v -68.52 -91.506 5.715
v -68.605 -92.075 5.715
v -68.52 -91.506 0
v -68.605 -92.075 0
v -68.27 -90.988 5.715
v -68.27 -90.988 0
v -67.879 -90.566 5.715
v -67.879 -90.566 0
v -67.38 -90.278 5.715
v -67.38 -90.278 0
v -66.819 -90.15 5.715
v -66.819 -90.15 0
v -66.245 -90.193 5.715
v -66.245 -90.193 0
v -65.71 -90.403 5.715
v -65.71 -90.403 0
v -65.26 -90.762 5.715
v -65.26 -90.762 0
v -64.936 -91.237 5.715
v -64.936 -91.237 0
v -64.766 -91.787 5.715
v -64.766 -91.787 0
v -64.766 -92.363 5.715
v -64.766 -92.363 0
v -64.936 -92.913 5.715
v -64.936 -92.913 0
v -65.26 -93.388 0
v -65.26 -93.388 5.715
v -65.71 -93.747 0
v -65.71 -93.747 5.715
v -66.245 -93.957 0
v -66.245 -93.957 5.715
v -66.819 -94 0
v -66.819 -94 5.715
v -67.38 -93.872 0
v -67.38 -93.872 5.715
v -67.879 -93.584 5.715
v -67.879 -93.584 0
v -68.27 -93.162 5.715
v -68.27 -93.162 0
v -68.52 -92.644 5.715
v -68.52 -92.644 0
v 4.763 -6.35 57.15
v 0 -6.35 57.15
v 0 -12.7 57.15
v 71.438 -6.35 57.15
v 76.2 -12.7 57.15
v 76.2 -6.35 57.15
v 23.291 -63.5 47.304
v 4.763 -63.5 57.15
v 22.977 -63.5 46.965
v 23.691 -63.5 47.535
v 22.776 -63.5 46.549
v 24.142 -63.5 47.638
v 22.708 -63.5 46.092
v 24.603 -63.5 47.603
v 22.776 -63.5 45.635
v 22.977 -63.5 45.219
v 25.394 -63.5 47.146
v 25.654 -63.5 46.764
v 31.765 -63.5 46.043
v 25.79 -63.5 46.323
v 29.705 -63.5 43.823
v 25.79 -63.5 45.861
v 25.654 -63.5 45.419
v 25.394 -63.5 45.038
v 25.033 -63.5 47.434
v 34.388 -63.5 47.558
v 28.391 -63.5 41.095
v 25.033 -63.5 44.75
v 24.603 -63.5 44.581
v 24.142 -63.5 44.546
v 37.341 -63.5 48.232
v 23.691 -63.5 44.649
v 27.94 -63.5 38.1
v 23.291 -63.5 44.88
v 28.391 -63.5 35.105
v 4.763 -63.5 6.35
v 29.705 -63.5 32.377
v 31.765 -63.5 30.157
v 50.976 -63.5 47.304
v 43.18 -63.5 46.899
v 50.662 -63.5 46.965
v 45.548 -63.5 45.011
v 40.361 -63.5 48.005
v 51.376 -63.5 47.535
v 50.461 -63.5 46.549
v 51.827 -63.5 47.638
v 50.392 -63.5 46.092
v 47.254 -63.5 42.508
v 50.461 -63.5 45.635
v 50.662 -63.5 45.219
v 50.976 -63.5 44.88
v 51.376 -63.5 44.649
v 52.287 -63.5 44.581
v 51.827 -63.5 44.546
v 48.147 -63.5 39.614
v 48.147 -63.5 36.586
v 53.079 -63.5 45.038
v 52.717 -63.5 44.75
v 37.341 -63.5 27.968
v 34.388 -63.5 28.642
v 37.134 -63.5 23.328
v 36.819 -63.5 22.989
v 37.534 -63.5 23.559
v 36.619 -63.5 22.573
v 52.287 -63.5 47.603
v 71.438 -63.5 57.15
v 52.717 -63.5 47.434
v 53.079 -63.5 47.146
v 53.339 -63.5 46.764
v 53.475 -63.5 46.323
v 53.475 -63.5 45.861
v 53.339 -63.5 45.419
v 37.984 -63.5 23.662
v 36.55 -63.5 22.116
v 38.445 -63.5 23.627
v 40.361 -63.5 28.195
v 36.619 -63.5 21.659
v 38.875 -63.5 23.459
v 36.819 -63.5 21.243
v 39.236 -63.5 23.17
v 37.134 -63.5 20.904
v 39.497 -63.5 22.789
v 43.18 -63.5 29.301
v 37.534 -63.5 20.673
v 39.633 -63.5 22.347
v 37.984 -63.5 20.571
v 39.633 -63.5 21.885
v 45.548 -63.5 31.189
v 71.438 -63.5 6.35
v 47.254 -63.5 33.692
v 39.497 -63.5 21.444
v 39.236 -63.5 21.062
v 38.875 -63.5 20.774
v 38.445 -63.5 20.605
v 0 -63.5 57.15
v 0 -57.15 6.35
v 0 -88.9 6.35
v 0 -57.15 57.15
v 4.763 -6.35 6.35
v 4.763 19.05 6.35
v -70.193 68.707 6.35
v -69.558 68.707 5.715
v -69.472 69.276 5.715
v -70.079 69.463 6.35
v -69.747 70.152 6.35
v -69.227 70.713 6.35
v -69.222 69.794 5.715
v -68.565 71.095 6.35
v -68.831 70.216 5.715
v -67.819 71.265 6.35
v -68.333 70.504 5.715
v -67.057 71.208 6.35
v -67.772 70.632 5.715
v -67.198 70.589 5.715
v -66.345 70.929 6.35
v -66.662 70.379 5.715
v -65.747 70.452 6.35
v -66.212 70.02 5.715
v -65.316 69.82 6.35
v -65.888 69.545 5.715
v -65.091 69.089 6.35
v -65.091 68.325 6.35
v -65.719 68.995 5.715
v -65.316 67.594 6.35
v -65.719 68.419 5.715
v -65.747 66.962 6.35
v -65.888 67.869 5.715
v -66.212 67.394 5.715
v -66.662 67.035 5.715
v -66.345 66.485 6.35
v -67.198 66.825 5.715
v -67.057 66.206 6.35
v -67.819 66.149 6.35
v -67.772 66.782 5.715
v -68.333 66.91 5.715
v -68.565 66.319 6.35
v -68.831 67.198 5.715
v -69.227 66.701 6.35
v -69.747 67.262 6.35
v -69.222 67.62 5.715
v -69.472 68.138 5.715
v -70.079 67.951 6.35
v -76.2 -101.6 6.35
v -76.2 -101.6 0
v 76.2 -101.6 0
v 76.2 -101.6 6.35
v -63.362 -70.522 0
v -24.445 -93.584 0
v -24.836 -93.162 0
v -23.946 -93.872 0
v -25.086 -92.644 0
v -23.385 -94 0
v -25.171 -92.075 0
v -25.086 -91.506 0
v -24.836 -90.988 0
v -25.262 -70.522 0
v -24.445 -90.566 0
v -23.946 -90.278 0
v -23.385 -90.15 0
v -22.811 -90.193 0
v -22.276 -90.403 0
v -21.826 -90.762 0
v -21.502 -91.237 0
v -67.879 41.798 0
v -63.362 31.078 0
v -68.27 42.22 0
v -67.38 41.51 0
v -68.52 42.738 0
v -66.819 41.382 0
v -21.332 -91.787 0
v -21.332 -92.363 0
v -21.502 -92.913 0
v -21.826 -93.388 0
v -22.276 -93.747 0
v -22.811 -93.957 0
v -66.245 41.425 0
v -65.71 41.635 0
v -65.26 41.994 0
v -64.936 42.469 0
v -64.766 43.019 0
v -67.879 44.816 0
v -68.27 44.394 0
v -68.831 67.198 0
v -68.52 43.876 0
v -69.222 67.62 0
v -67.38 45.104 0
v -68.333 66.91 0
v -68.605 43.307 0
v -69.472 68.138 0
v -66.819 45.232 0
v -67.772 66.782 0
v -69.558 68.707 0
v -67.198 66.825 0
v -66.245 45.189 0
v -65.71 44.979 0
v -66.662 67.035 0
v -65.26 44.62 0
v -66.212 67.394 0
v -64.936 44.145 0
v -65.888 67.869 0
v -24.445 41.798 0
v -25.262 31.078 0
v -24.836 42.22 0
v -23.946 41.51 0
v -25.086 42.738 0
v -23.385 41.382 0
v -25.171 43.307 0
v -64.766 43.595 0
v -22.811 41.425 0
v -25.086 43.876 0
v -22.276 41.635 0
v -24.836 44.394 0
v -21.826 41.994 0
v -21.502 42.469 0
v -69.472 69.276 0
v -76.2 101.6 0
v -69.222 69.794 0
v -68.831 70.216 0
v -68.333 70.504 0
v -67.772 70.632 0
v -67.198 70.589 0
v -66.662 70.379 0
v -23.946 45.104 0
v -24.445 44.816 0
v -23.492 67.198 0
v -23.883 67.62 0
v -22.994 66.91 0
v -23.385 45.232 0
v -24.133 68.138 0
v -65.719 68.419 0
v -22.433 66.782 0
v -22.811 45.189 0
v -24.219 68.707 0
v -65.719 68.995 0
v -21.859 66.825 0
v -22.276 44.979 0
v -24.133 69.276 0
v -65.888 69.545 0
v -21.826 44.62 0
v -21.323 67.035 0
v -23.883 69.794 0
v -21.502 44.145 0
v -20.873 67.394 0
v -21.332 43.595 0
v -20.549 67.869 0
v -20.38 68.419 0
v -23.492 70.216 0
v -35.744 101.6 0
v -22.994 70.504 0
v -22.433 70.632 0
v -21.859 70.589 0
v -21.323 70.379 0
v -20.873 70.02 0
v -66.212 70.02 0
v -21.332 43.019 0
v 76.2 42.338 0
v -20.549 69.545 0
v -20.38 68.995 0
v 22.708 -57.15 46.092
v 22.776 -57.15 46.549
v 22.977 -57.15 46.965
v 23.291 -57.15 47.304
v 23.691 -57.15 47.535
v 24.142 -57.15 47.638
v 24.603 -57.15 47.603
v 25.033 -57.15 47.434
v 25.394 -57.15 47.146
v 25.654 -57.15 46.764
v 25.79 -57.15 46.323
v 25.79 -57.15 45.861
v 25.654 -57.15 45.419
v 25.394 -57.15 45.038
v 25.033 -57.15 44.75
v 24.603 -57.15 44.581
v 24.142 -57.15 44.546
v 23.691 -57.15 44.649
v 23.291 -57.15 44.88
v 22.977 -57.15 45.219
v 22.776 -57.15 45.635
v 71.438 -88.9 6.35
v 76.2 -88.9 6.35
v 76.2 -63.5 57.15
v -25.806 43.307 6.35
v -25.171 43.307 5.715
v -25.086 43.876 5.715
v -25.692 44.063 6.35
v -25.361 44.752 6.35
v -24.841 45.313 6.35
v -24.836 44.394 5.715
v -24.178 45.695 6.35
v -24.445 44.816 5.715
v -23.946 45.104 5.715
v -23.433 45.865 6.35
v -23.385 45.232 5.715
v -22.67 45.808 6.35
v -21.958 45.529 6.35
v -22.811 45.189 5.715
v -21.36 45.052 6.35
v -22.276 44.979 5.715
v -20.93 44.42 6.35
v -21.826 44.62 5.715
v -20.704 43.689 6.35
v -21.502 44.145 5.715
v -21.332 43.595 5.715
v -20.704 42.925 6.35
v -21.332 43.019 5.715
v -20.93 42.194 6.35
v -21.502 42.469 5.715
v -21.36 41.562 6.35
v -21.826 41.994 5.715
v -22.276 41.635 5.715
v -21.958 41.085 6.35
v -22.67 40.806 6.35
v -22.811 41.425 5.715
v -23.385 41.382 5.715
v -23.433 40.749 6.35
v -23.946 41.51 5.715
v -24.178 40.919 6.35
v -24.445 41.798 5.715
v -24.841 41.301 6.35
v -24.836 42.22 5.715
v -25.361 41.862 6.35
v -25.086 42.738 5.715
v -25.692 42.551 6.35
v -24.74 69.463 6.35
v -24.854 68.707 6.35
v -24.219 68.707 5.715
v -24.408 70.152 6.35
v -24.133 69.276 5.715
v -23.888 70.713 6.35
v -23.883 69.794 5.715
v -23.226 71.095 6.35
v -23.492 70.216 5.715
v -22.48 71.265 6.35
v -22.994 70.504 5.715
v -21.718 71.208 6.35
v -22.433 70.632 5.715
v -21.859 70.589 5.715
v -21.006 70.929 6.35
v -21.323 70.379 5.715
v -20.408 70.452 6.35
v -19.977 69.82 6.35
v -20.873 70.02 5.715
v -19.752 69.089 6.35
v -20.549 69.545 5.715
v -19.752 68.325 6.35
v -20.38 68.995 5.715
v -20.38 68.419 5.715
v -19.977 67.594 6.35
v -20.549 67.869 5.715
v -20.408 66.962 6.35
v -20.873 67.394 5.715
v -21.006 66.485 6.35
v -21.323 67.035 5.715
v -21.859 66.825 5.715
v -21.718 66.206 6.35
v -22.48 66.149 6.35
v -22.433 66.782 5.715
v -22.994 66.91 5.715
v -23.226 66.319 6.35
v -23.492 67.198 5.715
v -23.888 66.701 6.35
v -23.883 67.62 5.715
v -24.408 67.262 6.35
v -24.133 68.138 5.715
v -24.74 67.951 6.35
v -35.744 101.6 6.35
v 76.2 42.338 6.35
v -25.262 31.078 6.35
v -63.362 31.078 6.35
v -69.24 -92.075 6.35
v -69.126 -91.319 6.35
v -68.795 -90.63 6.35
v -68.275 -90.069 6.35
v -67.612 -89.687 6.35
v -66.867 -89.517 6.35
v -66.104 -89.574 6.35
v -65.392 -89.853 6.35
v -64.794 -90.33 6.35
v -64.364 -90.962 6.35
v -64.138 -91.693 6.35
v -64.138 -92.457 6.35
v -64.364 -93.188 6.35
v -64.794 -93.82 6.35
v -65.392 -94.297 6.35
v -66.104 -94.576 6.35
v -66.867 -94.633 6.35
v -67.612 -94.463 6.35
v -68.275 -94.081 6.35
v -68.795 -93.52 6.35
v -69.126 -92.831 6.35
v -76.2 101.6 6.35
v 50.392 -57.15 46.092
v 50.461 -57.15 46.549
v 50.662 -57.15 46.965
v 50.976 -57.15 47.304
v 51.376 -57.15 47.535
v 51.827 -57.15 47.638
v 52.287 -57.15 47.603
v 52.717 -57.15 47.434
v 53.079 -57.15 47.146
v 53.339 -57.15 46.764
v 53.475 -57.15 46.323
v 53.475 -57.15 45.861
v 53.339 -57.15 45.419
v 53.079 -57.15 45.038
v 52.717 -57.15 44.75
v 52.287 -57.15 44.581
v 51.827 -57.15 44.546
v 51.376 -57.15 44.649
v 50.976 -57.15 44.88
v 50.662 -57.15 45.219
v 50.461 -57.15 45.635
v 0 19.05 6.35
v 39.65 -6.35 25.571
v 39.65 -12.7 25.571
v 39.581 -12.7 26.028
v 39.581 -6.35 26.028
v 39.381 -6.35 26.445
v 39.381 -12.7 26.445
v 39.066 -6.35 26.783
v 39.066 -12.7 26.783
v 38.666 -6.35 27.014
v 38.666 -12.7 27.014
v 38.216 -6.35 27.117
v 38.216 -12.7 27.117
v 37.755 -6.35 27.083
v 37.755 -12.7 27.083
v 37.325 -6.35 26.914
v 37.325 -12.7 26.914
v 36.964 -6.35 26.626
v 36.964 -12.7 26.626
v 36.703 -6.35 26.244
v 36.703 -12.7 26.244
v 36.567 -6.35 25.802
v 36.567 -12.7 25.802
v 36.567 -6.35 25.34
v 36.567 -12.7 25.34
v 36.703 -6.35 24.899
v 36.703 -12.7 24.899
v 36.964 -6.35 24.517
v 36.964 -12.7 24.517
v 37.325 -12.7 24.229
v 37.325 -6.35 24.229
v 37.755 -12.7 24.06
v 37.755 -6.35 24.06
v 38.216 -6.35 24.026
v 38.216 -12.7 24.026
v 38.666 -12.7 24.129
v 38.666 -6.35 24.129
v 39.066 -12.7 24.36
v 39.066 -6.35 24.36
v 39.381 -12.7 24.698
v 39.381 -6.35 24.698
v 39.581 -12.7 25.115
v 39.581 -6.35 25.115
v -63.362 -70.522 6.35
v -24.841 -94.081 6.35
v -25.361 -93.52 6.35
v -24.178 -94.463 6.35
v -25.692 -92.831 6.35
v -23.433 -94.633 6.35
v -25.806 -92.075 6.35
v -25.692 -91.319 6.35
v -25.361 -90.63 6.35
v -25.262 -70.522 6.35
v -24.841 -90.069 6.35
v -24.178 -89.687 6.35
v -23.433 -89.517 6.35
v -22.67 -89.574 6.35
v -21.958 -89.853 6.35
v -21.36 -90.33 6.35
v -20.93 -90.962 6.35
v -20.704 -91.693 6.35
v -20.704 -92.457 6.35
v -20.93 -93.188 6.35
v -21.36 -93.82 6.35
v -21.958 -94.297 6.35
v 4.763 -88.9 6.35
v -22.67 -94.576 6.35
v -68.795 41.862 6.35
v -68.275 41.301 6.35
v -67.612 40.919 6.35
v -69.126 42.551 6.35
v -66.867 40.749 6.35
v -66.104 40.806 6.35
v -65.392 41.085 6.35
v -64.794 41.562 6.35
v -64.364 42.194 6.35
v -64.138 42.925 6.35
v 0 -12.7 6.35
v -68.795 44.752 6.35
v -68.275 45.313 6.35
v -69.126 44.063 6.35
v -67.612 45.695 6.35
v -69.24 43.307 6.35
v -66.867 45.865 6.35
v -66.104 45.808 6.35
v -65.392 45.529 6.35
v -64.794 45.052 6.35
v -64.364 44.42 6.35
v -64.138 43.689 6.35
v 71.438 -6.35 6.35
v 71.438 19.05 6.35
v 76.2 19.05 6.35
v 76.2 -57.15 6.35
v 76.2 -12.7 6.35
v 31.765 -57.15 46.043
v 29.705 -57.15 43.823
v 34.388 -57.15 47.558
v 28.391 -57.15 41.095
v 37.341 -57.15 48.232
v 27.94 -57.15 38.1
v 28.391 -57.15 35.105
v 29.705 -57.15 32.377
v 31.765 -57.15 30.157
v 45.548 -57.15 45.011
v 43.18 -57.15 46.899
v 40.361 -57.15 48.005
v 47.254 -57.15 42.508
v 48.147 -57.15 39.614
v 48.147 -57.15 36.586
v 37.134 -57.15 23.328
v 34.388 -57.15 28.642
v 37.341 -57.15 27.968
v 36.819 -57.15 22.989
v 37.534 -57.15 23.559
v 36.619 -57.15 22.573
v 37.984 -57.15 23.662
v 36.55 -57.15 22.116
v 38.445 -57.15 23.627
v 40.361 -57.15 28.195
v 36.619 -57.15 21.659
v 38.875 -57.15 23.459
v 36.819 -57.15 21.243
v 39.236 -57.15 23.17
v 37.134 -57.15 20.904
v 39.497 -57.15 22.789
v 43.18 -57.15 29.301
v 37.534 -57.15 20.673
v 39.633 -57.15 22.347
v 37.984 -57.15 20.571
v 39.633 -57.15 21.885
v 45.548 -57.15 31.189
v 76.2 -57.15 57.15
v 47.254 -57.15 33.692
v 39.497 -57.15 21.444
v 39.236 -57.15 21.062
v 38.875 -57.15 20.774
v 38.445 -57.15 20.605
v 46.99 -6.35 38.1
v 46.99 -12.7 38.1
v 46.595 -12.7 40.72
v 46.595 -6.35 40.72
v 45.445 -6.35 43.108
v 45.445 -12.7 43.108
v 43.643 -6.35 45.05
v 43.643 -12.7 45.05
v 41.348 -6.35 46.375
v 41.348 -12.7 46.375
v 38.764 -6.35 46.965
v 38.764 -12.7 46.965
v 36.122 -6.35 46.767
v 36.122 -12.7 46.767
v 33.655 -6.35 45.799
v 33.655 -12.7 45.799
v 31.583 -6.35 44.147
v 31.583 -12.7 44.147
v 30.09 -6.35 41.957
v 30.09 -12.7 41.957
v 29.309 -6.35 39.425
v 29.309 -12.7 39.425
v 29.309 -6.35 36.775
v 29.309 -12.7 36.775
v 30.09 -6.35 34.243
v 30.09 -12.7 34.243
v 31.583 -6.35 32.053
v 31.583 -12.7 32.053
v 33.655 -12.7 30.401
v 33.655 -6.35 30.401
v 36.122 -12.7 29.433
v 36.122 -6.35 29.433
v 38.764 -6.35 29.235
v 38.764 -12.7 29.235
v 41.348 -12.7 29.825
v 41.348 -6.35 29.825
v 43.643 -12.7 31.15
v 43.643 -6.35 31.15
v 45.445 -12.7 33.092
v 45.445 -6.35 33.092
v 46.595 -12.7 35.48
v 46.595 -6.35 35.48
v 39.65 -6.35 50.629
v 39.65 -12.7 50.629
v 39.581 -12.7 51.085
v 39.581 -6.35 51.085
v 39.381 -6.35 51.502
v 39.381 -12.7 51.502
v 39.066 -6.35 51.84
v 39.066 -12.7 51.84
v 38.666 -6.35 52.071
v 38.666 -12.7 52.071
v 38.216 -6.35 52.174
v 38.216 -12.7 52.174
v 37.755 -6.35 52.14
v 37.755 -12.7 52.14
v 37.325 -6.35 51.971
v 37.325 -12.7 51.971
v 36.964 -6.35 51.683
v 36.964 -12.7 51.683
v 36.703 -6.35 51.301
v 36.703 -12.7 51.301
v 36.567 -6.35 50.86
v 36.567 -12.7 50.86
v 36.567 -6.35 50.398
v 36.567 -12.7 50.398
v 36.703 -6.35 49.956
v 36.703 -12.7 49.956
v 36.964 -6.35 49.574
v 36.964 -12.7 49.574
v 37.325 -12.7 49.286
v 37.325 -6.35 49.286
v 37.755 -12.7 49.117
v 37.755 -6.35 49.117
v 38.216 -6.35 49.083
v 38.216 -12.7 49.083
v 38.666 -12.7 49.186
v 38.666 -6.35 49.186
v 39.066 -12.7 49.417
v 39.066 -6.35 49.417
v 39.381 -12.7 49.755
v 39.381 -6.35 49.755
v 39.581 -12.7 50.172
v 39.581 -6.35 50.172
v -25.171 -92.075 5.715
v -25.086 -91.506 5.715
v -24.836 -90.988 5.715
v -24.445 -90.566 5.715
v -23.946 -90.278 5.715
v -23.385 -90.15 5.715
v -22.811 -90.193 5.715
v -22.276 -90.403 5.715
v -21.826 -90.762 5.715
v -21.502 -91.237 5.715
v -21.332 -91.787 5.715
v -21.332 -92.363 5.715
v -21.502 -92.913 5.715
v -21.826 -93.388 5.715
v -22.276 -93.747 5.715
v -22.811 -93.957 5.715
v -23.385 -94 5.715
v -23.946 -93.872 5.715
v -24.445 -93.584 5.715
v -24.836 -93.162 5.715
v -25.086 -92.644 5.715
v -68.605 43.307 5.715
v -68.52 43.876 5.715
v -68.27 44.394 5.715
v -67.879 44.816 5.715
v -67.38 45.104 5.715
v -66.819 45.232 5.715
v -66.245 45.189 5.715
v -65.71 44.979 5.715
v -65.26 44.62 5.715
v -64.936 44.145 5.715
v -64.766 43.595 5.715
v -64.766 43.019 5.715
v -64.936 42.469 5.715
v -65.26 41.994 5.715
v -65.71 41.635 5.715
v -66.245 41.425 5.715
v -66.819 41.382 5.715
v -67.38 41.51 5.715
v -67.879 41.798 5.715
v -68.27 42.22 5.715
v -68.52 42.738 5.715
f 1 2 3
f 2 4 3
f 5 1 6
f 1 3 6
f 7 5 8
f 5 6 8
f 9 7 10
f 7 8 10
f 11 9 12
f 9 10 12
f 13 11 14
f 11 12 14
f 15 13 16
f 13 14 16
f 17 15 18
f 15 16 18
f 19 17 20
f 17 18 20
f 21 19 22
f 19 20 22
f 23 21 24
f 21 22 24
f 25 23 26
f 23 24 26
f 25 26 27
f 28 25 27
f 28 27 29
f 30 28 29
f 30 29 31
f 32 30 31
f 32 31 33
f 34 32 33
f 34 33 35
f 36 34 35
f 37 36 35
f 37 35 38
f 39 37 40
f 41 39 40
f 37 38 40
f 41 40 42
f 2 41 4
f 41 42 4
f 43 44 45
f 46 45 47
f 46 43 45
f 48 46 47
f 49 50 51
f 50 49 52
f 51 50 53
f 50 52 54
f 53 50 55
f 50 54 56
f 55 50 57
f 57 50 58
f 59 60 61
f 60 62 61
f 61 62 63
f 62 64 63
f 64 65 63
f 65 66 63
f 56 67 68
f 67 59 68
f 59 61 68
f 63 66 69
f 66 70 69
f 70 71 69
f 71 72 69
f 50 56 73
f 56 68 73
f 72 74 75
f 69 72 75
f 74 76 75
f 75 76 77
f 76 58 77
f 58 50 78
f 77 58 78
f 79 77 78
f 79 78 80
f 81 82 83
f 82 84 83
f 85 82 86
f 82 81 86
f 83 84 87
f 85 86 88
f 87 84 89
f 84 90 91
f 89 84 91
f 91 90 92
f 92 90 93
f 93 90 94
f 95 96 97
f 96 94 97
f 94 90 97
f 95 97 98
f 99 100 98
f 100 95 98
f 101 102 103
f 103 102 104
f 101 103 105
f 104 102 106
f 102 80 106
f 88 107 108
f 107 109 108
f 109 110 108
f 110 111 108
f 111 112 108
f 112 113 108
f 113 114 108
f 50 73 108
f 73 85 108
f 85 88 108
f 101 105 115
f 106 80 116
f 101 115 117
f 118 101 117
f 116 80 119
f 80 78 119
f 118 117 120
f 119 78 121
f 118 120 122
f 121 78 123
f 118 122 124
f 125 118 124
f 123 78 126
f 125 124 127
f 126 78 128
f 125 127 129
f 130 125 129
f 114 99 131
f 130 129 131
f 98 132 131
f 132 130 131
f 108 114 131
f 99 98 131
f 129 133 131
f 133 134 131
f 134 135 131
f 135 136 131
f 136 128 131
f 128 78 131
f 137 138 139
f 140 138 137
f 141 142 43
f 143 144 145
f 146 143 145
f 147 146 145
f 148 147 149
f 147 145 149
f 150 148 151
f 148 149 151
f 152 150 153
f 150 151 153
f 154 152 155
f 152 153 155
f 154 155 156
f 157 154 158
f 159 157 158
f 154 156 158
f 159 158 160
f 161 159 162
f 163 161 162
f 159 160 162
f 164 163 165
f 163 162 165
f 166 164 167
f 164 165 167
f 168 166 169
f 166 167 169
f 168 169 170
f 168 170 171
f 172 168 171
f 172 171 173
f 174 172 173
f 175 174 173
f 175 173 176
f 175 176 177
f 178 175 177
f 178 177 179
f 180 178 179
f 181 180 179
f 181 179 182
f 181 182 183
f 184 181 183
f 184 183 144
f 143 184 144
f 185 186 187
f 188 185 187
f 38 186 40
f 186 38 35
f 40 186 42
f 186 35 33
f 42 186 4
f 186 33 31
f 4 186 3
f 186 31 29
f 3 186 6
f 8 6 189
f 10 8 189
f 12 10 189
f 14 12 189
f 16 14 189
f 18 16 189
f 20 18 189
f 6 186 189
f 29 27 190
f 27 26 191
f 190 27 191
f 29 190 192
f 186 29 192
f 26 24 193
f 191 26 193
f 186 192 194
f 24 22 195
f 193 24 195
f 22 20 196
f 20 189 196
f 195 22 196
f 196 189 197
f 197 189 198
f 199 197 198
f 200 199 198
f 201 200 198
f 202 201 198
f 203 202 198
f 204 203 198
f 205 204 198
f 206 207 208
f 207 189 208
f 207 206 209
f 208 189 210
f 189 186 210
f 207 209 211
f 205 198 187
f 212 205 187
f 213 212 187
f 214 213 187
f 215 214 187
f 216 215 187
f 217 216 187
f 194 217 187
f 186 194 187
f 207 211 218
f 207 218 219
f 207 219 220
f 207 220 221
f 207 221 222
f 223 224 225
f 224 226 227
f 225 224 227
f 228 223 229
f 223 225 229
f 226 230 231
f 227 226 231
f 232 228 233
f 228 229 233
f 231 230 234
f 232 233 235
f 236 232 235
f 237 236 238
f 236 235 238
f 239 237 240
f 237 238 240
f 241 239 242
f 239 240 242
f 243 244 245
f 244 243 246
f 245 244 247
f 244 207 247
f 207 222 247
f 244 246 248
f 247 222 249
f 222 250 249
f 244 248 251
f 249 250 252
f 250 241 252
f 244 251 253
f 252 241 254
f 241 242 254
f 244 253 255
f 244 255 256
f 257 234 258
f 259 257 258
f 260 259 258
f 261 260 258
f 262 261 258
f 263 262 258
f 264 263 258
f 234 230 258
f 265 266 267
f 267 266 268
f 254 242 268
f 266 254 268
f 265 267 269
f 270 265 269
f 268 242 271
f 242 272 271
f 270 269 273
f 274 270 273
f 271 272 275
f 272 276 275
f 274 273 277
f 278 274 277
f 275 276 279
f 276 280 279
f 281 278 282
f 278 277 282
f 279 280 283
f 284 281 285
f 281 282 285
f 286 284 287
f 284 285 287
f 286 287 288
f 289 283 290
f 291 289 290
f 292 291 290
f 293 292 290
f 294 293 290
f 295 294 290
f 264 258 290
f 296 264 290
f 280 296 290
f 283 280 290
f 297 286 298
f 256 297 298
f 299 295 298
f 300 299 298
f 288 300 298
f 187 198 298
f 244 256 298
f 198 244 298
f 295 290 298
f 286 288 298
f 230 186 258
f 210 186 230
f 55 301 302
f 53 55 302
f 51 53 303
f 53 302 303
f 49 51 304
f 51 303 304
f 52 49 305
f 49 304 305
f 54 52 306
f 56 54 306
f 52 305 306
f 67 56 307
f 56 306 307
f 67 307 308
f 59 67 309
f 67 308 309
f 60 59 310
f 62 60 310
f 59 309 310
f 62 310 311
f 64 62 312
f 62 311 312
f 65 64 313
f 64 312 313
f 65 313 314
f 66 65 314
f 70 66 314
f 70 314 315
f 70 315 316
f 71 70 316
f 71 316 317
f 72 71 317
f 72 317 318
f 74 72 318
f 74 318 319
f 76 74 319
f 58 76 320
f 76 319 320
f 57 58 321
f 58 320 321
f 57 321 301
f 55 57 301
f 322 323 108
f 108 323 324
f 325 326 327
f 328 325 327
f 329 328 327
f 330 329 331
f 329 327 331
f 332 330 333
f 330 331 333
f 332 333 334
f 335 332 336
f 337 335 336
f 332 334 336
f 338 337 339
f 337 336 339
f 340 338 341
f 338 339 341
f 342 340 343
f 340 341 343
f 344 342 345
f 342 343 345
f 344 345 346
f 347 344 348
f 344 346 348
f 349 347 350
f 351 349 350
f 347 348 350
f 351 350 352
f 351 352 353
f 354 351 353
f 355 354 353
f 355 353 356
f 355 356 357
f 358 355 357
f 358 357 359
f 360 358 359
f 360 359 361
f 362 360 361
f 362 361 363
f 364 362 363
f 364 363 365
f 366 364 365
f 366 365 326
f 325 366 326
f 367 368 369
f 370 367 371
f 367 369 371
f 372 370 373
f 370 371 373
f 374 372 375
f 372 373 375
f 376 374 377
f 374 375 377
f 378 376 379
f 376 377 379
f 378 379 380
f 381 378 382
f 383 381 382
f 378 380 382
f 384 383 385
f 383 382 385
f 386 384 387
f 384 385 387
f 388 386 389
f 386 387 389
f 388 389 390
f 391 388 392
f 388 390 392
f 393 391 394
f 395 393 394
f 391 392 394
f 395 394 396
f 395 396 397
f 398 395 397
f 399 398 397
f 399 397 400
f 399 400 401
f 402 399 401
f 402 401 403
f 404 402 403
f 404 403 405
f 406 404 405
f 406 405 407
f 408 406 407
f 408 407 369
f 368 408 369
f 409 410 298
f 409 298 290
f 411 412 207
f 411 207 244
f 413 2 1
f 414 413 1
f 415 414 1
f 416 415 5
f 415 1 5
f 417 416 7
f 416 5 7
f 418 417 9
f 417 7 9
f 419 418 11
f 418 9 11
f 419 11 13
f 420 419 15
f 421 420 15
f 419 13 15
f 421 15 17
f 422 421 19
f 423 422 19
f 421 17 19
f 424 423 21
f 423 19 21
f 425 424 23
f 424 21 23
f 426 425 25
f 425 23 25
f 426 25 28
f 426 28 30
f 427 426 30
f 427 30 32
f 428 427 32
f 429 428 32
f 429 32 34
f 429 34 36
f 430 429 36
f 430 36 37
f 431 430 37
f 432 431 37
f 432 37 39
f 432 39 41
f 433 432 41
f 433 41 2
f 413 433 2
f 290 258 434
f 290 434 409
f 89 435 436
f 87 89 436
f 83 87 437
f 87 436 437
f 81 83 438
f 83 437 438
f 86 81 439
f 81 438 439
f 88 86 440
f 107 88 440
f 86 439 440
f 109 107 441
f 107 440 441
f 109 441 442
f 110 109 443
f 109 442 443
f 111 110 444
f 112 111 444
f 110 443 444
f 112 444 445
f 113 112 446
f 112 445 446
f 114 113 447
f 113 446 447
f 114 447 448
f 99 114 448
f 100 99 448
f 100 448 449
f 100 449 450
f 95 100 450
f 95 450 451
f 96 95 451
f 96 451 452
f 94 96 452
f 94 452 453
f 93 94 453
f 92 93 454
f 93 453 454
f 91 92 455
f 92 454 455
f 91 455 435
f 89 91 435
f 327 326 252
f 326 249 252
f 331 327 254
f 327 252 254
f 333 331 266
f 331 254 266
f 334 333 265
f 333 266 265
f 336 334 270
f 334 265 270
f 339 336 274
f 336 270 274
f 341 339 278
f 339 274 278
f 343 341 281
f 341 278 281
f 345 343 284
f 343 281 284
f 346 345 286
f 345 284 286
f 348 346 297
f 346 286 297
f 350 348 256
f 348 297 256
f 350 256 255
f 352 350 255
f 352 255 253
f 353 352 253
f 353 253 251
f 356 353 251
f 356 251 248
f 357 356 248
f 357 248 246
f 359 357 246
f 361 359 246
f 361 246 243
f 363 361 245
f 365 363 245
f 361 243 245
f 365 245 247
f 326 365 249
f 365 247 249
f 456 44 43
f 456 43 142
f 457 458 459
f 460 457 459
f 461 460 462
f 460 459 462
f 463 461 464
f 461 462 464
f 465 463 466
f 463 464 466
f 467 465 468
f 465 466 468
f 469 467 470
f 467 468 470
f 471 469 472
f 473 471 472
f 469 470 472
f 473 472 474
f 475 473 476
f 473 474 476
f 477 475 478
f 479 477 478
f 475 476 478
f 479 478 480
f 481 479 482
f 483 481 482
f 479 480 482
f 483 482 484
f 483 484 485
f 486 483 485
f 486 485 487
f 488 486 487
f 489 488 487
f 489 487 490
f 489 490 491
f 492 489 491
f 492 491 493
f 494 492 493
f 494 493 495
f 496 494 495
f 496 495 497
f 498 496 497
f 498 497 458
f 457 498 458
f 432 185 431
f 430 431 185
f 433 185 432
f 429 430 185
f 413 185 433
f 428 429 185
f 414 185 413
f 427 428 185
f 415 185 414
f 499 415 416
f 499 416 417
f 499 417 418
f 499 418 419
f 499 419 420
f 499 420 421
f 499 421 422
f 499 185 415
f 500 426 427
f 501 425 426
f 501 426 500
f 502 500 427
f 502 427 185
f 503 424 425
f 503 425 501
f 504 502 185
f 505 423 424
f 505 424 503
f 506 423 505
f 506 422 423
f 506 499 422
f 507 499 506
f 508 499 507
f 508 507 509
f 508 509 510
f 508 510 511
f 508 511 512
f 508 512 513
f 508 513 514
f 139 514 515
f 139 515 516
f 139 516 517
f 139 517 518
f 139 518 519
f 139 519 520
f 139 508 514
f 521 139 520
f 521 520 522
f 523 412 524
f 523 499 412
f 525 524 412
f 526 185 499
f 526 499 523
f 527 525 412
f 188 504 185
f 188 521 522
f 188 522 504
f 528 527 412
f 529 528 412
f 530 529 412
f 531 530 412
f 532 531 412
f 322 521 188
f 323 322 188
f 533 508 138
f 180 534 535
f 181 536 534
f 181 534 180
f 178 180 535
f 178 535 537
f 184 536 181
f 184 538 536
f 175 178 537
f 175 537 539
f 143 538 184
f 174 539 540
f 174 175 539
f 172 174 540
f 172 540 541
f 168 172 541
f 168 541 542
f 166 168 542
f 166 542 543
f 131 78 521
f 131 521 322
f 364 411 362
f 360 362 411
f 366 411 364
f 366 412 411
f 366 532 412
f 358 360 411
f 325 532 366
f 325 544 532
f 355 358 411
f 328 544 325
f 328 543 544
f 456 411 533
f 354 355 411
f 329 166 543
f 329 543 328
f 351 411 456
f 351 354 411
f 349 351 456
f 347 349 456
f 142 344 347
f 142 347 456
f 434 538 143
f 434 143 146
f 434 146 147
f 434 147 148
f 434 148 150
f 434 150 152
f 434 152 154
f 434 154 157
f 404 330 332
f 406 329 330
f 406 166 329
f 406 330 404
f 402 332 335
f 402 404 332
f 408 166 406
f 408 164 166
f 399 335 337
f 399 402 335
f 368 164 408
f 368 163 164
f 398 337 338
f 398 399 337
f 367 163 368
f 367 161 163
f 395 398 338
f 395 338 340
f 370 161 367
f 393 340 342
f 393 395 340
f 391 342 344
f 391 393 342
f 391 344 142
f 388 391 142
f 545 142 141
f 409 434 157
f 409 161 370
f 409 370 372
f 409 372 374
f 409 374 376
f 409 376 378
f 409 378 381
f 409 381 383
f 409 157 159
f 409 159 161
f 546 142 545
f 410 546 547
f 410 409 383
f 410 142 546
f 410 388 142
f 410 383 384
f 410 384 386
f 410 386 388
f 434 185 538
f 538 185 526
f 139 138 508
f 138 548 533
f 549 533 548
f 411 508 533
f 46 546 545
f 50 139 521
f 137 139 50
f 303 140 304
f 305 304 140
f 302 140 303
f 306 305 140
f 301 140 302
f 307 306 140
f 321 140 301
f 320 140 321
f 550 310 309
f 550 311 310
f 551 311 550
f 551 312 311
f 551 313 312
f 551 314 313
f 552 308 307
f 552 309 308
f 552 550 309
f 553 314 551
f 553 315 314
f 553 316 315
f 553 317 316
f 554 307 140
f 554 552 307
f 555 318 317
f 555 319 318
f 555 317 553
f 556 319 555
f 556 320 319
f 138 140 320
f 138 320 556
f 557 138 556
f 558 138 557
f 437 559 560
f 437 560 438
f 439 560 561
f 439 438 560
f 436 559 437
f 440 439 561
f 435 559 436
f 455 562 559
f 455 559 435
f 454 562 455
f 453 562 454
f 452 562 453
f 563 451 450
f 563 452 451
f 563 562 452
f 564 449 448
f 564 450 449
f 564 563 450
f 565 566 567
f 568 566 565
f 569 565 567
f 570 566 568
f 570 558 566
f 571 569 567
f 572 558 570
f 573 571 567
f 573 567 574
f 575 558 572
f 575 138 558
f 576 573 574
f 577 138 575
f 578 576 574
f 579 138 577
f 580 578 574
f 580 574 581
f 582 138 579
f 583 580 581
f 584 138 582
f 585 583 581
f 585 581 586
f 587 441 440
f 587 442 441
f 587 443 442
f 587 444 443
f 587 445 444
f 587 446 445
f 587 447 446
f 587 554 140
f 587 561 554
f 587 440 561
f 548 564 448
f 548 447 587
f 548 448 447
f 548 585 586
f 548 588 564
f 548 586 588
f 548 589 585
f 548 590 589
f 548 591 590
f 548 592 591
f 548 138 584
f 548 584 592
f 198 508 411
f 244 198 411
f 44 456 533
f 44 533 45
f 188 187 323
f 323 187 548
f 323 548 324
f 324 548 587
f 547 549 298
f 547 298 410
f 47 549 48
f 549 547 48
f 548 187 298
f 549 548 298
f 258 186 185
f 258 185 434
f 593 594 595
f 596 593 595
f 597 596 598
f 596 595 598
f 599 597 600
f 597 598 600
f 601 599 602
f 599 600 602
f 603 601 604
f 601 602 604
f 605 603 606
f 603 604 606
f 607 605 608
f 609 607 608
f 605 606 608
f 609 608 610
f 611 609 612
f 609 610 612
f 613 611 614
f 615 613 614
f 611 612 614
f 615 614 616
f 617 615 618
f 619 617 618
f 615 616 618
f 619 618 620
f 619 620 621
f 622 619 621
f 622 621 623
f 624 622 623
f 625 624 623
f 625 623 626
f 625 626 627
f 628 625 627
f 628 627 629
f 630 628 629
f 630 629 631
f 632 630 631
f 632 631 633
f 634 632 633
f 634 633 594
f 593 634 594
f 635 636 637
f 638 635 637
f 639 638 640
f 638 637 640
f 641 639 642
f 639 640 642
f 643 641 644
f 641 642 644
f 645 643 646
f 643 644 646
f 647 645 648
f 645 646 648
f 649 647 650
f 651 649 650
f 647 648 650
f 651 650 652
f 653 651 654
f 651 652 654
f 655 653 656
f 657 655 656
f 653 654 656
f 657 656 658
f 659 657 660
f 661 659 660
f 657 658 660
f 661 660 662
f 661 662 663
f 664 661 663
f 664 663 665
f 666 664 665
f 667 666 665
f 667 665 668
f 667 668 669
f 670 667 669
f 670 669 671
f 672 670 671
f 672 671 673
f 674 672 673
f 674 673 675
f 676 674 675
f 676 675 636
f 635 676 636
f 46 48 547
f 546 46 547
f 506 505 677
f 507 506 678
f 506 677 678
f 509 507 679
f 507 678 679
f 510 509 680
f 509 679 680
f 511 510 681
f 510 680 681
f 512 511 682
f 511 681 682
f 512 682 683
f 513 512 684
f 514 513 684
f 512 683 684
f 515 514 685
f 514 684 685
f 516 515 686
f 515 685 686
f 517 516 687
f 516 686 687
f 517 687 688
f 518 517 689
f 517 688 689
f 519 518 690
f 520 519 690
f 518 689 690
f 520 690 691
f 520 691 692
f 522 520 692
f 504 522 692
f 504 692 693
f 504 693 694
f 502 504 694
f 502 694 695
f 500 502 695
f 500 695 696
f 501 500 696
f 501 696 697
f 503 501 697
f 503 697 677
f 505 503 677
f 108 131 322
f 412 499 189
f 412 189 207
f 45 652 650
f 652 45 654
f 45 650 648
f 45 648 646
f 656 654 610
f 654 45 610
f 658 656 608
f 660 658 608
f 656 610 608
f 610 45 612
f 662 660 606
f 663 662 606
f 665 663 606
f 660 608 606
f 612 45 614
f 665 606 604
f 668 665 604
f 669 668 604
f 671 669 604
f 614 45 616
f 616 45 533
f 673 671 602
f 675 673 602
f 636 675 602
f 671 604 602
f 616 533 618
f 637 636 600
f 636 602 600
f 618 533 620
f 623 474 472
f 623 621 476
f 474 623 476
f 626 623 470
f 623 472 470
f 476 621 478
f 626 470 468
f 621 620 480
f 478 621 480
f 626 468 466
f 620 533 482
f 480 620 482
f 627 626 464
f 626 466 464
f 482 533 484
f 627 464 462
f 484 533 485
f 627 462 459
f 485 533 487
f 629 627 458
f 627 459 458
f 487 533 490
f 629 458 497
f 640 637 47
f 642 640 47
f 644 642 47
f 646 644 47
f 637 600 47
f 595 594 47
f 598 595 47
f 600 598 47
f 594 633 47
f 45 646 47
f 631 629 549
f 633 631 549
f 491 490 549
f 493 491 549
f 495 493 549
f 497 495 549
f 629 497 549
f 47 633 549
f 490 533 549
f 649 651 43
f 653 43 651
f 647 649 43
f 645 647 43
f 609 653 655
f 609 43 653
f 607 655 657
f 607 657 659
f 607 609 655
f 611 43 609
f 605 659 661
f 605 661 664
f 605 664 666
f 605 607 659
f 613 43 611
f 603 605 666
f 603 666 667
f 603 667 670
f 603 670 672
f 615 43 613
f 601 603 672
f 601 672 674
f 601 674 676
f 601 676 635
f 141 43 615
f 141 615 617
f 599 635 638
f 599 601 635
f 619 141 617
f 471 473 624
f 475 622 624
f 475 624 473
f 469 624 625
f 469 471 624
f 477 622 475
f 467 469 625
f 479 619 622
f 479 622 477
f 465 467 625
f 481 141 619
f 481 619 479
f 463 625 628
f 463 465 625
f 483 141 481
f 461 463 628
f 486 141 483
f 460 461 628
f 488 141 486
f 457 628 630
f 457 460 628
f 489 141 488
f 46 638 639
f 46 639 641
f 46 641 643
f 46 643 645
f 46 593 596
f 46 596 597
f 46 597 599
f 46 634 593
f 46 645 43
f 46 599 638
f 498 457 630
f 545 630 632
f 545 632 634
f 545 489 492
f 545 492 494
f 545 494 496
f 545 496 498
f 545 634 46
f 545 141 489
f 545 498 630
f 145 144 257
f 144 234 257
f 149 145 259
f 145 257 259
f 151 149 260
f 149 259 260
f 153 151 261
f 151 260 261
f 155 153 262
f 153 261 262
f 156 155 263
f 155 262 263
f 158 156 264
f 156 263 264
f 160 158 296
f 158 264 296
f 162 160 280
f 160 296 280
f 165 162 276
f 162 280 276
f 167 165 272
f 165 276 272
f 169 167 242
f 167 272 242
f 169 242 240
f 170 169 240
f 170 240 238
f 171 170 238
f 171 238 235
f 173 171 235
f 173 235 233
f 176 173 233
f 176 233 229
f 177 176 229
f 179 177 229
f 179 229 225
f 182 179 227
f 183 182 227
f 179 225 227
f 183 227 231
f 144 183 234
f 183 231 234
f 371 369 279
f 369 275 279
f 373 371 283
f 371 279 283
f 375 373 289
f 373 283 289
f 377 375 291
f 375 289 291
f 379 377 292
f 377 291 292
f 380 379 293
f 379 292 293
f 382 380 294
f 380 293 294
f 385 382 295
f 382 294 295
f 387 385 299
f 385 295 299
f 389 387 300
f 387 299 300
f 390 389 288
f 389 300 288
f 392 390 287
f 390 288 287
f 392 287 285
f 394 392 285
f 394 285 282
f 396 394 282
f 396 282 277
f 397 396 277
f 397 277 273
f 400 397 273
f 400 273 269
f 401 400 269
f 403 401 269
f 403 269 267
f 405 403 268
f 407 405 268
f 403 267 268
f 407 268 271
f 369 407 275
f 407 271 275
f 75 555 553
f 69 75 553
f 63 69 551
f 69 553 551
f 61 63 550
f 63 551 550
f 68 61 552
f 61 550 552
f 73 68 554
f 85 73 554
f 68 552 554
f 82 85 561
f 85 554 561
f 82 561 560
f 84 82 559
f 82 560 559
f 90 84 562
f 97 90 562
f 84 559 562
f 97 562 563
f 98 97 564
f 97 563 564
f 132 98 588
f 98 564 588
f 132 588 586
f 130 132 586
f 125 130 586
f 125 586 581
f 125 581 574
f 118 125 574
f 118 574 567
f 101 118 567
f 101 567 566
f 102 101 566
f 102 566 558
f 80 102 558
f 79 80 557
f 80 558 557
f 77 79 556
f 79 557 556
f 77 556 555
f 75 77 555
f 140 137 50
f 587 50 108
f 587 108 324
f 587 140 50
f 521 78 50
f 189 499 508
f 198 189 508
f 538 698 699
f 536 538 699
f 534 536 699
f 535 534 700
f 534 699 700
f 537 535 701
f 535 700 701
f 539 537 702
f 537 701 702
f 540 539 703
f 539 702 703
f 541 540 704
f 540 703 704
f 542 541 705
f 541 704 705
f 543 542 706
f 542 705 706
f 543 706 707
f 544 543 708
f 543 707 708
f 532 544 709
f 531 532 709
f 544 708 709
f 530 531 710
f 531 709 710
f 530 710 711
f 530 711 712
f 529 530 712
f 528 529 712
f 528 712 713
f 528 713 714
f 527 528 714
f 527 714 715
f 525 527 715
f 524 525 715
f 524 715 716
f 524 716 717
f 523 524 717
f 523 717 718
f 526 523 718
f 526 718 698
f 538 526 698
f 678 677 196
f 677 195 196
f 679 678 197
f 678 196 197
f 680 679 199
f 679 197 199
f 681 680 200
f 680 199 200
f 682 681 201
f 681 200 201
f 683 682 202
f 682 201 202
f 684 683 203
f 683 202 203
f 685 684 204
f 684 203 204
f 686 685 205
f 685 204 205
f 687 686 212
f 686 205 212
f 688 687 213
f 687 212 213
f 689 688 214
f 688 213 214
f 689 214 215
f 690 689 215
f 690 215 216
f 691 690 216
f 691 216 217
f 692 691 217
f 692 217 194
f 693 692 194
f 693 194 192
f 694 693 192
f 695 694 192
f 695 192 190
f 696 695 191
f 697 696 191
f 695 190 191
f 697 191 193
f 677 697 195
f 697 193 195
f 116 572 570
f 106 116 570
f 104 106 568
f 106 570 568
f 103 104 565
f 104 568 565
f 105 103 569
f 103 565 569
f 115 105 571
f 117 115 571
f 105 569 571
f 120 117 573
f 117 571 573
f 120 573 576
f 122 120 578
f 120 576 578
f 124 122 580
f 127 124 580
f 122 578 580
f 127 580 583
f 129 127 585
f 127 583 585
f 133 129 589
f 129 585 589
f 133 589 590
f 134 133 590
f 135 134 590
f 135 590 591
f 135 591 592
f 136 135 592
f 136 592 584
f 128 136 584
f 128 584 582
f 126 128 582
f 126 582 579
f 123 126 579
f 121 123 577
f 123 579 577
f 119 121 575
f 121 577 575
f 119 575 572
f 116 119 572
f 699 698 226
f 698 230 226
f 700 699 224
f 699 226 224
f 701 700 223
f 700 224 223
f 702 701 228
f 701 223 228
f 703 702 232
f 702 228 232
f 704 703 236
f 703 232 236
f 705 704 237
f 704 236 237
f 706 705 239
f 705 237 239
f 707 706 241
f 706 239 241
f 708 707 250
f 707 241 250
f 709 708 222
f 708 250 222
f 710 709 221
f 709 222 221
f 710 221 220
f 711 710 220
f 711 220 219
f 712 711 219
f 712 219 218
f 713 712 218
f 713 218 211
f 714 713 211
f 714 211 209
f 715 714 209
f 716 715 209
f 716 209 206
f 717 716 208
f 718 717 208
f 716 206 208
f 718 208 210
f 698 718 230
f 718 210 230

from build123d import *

# Parameters (mm, degrees)
SKETCH1_W                             = 152.4
SKETCH1_H                             = 203.2
BASE_DEPTH                            = 6.35
SKETCH2_W                             = 76.2
SKETCH2_H                             = 6.35
MOUNT_WALLS_DEPTH                     = 50.8
MOUNT_SUPPORT_DEPTH                   = 4.7625
F_24_0_152_DIAMETER_HOLE1_D           = 3.8608
F_24_0_152_DIAMETER_HOLE1_CSINK_D     = 5.1308
F_24_0_152_DIAMETER_HOLE1_CSINK_ANGLE = 90
SKETCH6_R                             = 8.89
SKETCH6_R_2                           = 1.55
CUT_EXTRUDE1_DEPTH                    = 149.785256326
SKETCH7_R                             = 10.16
SKETCH7_R_2                           = 1.55
CUT_EXTRUDE2_DEPTH                    = 6.35
CUT_EXTRUDE3_REACH                    = 138.783
SKETCH8_W                             = 38.1
SKETCH8_H                             = 101.6


with BuildPart() as part:
    # Sketch1 → base (new body)
    with BuildSketch(Plane.XY):
        Rectangle(SKETCH1_W, SKETCH1_H)
    extrude(amount=BASE_DEPTH)

    # Sketch2 → mount walls (add)
    with BuildSketch(Plane.XY.offset(6.35)):
        with Locations((38.1, -9.525)):
            Rectangle(SKETCH2_W, SKETCH2_H)
        with Locations((38.1, -60.325)):
            Rectangle(SKETCH2_W, SKETCH2_H)
    extrude(amount=MOUNT_WALLS_DEPTH)

    # Sketch3 → mount support (add)
    with BuildSketch(Plane(origin=(76.2, 0, 0), x_dir=(0, 0, -1), z_dir=(1, 0, 0))):
        Polygon((-6.35, -88.9), (-57.15, -63.5), (-6.35, -63.5), align=None)
        Polygon((-57.15, -6.35), (-6.35, 19.05), (-6.35, -6.35), align=None)
    mount_support = extrude(amount=-MOUNT_SUPPORT_DEPTH)

    # Mirror1: mount support across plane
    add(mount_support.mirror(Plane(origin=(38.1, 0, 0), x_dir=(0, 0, 1), z_dir=(1, 0, 0))))

    # #24 (0.152) Diameter Hole1 (through all)
    with Locations(Plane.XY.offset(6.35)):
        with Locations((-66.675, -92.075), (-66.675, 43.307), (-23.241, 43.307), (-23.241, -92.075), (-67.6275, 68.707), (-22.2885, 68.707)):
            CounterSinkHole(F_24_0_152_DIAMETER_HOLE1_D / 2, F_24_0_152_DIAMETER_HOLE1_CSINK_D / 2, counter_sink_angle=F_24_0_152_DIAMETER_HOLE1_CSINK_ANGLE)

    # Sketch6 → Cut-Extrude1 (cut, through all)
    with BuildSketch(Plane.XZ.offset(12.7)):
        with Locations((38.1, 38.1)):
            Circle(SKETCH6_R)
        with Locations((38.1, 50.62855)):
            Circle(SKETCH6_R_2)
        with Locations((38.1, 25.57145)):
            Circle(SKETCH6_R_2)
    extrude(amount=-CUT_EXTRUDE1_DEPTH, mode=Mode.SUBTRACT)

    # Sketch7 → Cut-Extrude2 (cut)
    with BuildSketch(Plane(origin=(0, -57.15, 0), x_dir=(1, 0, 0), z_dir=(0, 1, 0))):
        with Locations(Location((38.1, -38.1, 0), (0, 0, 180))):
            Circle(SKETCH7_R)
        with Locations(Location((24.2576, -46.091913366, 0), (0, 0, 180))):
            Circle(SKETCH7_R_2)
        with Locations(Location((38.1, -22.116173268, 0), (0, 0, 180))):
            Circle(SKETCH7_R_2)
        with Locations(Location((51.9424, -46.091913366, 0), (0, 0, 180))):
            Circle(SKETCH7_R_2)
    extrude(amount=-CUT_EXTRUDE2_DEPTH, mode=Mode.SUBTRACT)

    # Sketch8 → Cut-Extrude3 (cut, up to next)
    with BuildSketch(Plane.XY.offset(6.35), mode=Mode.PRIVATE) as cut_extrude3_sk1:
        Polygon((76.2, 42.338114892), (-35.744340046, 101.6), (76.2, 101.6), align=None)
    cut_extrude3_tool1 = extrude(cut_extrude3_sk1.sketch, amount=-CUT_EXTRUDE3_REACH, mode=Mode.PRIVATE) & part.part
    # Sketch8 → Cut-Extrude3 (cut, up to next)
    with BuildSketch(Plane.XY.offset(6.35), mode=Mode.PRIVATE) as cut_extrude3_sk2:
        with Locations((-44.31191896, -19.722477487)):
            Rectangle(SKETCH8_W, SKETCH8_H)
    cut_extrude3_tool2 = extrude(cut_extrude3_sk2.sketch, amount=-CUT_EXTRUDE3_REACH, mode=Mode.PRIVATE) & part.part
    add(cut_extrude3_tool1.solids().sort_by_distance((38.88522, 81.846038, 6.35))[0], mode=Mode.SUBTRACT)
    add(cut_extrude3_tool2.solids().sort_by_distance((-44.311919, -19.722477, 6.35))[0], mode=Mode.SUBTRACT)


solid = part.part
